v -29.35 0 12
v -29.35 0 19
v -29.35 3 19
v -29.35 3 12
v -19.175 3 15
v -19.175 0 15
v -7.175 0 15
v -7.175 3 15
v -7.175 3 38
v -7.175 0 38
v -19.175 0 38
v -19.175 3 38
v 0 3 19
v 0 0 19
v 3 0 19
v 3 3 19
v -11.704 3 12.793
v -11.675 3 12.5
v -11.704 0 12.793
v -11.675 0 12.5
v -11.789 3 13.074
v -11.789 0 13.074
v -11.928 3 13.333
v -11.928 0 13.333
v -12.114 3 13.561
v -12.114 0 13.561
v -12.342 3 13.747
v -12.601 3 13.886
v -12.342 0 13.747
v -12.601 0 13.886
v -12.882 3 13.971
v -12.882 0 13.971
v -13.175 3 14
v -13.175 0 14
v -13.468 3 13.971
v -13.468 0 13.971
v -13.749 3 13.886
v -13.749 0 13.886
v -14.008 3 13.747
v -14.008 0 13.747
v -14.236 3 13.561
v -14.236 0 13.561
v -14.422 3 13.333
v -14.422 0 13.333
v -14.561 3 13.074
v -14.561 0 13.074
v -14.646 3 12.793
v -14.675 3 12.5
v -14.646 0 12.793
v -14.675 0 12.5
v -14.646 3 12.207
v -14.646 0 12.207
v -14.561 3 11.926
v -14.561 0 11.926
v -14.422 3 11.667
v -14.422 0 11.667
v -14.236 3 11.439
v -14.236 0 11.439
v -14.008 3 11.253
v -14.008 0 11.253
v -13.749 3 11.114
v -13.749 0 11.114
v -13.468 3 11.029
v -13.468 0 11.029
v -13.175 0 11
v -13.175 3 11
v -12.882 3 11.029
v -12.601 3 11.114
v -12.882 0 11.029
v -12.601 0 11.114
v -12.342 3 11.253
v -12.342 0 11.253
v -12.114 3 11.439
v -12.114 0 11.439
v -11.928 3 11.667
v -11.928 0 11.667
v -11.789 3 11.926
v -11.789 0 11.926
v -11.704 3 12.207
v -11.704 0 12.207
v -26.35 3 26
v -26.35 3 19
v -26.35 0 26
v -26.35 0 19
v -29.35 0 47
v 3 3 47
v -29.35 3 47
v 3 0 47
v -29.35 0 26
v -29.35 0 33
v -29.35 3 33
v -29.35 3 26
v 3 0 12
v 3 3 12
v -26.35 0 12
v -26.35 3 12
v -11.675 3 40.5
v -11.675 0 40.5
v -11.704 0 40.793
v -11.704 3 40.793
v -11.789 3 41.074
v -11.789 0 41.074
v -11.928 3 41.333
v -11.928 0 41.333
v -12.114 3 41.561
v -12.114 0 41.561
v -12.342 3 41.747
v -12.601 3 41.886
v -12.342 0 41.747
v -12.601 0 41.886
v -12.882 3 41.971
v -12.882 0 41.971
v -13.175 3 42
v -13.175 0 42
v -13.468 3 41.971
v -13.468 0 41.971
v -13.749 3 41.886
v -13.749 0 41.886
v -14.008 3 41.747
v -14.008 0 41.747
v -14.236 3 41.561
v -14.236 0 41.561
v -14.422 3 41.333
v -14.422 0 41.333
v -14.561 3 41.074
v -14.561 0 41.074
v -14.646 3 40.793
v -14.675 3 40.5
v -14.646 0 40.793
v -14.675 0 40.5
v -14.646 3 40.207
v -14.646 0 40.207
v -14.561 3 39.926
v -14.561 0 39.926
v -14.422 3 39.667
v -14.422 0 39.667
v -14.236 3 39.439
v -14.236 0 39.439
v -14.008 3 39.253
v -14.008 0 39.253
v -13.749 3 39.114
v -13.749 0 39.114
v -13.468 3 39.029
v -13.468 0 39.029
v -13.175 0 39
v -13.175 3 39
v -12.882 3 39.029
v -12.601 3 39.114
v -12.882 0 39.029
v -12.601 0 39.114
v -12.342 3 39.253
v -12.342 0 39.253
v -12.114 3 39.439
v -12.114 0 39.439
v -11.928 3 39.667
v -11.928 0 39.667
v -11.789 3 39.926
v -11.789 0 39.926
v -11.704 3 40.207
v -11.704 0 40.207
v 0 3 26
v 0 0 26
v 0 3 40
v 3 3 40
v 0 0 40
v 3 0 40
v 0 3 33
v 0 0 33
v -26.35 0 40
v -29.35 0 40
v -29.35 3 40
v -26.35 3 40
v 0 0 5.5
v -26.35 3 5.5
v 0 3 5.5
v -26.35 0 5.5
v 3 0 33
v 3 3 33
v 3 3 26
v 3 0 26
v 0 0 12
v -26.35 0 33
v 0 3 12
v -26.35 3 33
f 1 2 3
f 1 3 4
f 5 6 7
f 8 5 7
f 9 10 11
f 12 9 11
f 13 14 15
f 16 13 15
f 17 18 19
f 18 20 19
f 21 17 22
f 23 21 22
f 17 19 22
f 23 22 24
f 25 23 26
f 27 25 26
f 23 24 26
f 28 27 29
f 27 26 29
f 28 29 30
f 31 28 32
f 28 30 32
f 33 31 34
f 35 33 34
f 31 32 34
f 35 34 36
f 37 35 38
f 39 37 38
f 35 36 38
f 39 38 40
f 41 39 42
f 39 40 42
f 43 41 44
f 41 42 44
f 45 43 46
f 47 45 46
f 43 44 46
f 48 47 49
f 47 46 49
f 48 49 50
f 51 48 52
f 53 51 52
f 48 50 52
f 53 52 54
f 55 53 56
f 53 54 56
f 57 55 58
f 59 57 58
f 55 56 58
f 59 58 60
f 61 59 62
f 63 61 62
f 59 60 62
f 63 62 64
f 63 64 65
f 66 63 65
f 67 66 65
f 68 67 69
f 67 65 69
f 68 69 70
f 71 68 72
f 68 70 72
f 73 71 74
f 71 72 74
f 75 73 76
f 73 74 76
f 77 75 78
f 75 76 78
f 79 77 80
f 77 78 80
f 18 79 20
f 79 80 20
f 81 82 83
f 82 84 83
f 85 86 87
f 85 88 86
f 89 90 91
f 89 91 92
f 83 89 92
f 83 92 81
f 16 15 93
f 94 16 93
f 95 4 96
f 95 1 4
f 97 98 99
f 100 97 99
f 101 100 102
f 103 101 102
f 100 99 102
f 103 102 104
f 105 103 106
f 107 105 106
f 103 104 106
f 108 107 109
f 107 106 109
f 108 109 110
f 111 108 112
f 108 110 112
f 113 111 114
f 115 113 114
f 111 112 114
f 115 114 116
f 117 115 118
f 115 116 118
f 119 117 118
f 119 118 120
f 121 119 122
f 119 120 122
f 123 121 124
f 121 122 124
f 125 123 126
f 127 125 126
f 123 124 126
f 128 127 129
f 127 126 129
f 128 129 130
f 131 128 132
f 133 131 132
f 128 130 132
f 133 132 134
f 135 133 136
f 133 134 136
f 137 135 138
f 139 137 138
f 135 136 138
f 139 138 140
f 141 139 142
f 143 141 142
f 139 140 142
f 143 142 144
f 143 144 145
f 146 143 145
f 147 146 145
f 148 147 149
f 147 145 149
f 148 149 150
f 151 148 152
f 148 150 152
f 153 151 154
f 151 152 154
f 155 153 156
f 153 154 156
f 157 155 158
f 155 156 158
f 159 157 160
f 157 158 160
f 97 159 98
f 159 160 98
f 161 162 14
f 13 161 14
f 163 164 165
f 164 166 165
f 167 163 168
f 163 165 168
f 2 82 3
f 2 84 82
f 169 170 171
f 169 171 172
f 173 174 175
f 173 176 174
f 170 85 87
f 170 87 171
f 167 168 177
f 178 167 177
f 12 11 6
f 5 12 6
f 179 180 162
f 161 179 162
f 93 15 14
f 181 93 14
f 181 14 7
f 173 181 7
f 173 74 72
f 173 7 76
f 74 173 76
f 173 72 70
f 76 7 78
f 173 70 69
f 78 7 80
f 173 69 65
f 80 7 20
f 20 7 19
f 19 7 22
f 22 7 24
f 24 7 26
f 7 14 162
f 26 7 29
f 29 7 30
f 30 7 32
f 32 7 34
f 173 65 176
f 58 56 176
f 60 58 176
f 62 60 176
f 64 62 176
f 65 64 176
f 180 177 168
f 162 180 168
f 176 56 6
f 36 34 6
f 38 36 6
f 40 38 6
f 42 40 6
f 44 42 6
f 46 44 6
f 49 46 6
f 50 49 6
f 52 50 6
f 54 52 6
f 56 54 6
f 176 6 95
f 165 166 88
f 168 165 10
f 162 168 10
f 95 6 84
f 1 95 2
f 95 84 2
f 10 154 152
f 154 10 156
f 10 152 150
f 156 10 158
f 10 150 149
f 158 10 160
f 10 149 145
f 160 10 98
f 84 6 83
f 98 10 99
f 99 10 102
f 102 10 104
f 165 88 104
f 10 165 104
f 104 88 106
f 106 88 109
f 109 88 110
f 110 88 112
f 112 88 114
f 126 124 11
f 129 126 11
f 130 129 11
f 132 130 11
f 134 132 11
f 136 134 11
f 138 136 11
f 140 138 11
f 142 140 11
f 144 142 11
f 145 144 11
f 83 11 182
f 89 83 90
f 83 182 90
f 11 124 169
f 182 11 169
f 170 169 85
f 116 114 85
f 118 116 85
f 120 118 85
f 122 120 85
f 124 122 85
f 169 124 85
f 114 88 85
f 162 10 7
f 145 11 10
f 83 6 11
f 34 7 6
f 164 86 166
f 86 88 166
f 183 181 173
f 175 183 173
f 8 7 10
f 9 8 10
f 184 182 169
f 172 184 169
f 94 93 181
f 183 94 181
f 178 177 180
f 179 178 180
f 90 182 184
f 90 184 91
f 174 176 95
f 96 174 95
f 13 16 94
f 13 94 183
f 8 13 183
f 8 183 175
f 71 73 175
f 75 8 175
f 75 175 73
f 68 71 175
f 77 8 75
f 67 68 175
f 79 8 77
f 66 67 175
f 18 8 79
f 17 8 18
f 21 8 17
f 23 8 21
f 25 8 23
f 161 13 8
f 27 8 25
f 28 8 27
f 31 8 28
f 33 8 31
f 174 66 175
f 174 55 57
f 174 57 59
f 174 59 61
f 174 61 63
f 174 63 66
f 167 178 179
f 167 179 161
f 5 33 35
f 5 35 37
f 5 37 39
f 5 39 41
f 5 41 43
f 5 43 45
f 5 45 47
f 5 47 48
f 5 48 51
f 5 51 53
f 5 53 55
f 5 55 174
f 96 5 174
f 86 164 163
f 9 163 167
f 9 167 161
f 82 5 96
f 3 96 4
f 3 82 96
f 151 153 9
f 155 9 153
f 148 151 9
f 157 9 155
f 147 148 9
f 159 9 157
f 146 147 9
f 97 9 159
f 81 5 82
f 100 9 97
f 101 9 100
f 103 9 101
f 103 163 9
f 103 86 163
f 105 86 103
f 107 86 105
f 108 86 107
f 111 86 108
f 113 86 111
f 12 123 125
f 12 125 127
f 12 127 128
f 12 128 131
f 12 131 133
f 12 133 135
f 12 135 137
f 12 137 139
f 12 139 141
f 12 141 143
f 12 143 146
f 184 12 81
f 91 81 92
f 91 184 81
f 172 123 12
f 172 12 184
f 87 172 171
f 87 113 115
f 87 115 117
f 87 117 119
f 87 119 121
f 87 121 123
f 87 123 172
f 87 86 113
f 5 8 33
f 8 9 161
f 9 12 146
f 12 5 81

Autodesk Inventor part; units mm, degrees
ref_plane "YZ Plane" through (0, 0, 0) normal (1, 0, 0) x (0, 1, 0)
ref_plane "XZ Plane" through (0, 0, 0) normal (0, 1, 0) x (-1, 0, 0)
ref_plane "XY Plane" through (0, 0, 0) normal (0, 0, 1) x (1, 0, 0)
sketch "Boceto1" plane through (0, 0, 0) normal (0, 1, 0) x (-1, 0, 0)
  line L0 (0, 0) -> (26.35, 0)
  line L1 (26.35, 10) -> (0, 10)
  line L2 (26.35, 10) -> (29.35, 10)
  line L3 (29.35, 10) -> (29.35, 0)
  line L4 (29.35, 0) -> (26.35, 0)
  line L5 (0, 10) -> (-3, 10)
  line L6 (-3, 10) -> (-3, 0)
  line L7 (-3, 0) -> (0, 0)
extrude "Extrusión1" add sketch "Boceto1" along normal blind 3
sketch "Boceto2" plane through (0, 0, 0) normal (0, -1, 0) x (1, 0, 0)
  line L0 (-26.35, 10) -> (-26.35, 40)
  line L1 (-26.35, 47) -> (0, 47)
  line L2 (0, 40) -> (0, 10)
  line L3 (-26.35, 10) -> (0, 10)
  line L4 (-13.175, 15) -> (-7.175, 15)
  line L5 (-7.175, 15) -> (-7.175, 38)
  line L6 (-7.175, 38) -> (-19.175, 38)
  line L7 (-19.175, 38) -> (-19.175, 15)
  line L8 (-19.175, 15) -> (-13.175, 15)
  circle A0 centre (-13.175, 40.5) radius 1.5
  circle A1 centre (-13.175, 12.5) radius 1.5
  line L9 (-26.35, 47) -> (-29.35, 47)
  line L10 (-29.35, 47) -> (-29.35, 40)
  line L11 (-29.35, 40) -> (-26.35, 40)
  line L12 (0, 47) -> (3, 47)
  line L13 (3, 47) -> (3, 40)
  line L14 (3, 40) -> (0, 40)
  point P0 (0, 0)
  dimension "d19" = 7
  dimension "d20" = 3
extrude "Extrusión2" add sketch "Boceto2" against normal blind 3
sketch "Boceto3" plane through (0, 0, 0) normal (0, -1, 0) x (1, 0, 0)
  line L0 (0, 33) -> (3, 33)
  line L1 (3, 33) -> (3, 26)
  line L2 (3, 26) -> (0, 26)
  line L3 (0, 26) -> (0, 33)
  line L4 (-26.35, 33) -> (-29.35, 33)
  line L5 (-29.35, 33) -> (-29.35, 26)
  line L6 (-29.35, 26) -> (-26.35, 26)
  line L7 (-26.35, 26) -> (-26.35, 33)
  line L8 (-26.35, 19) -> (-29.35, 19)
  line L9 (-29.35, 19) -> (-29.35, 12)
  line L10 (-29.35, 12) -> (-26.35, 12)
  line L11 (-26.35, 12) -> (-26.35, 19)
  line L12 (0, 19) -> (3, 19)
  line L13 (3, 19) -> (3, 12)
  line L14 (3, 12) -> (0, 12)
  line L15 (0, 12) -> (0, 19)
  point P0 (0, 0)
  point P1 (0, 40)
extrude "Extrusión3" add sketch "Boceto3" against normal blind 3
sketch "Boceto4" plane through (0, 0, 0) normal (0, -1, 0) x (1, 0, 0)
  line L0 (-13.175, 5.5) -> (-26.35, 5.5)
  line L1 (-26.35, 5.5) -> (-29.35, 5.5)
  line L2 (-29.35, 0) -> (-29.35, 10) projected
  line L3 (-13.175, 5.5) -> (3, 5.5)
  line L4 (3, 10) -> (3, 0) projected
  line L5 (3, 0) -> (-29.35, 0) projected
  line L6 (3, 5.5) -> (3, 0)
  line L7 (3, 0) -> (-29.35, 0)
  line L8 (-29.35, 0) -> (-29.35, 5.5)
  point P0 (0, 0)
  point P1 (-13.175, 12.5)
  point P2 (-26.35, 10)
extrude "Extrusión4" cut sketch "Boceto4" against normal blind 3
sketch "Boceto5" plane through (0, 0, 0) normal (0, -1, 0) x (1, 0, 0)
  line L0 (-26.35, 10) -> (-26.35, 12) projected
  line L1 (-26.35, 10) -> (-26.35, 5.5)
  line L2 (-26.35, 5.5) -> (-29.35, 5.5)
  line L3 (-29.35, 10) -> (-26.35, 10) projected
  line L4 (-29.35, 5.5) -> (-29.35, 10)
  line L5 (-29.35, 10) -> (-26.35, 10)
  line L6 (0, 10) -> (3, 10) projected
  line L7 (0, 10) -> (3, 10)
  line L8 (3, 10) -> (3, 5.5) projected
  line L9 (3, 10) -> (3, 5.5)
  line L10 (3, 5.5) -> (0, 5.5)
  line L11 (0, 10) -> (0, 5.5)
  point P0 (0, 0)
extrude "Extrusión5" cut sketch "Boceto5" against normal blind 3
properties part number "muñeca1"
